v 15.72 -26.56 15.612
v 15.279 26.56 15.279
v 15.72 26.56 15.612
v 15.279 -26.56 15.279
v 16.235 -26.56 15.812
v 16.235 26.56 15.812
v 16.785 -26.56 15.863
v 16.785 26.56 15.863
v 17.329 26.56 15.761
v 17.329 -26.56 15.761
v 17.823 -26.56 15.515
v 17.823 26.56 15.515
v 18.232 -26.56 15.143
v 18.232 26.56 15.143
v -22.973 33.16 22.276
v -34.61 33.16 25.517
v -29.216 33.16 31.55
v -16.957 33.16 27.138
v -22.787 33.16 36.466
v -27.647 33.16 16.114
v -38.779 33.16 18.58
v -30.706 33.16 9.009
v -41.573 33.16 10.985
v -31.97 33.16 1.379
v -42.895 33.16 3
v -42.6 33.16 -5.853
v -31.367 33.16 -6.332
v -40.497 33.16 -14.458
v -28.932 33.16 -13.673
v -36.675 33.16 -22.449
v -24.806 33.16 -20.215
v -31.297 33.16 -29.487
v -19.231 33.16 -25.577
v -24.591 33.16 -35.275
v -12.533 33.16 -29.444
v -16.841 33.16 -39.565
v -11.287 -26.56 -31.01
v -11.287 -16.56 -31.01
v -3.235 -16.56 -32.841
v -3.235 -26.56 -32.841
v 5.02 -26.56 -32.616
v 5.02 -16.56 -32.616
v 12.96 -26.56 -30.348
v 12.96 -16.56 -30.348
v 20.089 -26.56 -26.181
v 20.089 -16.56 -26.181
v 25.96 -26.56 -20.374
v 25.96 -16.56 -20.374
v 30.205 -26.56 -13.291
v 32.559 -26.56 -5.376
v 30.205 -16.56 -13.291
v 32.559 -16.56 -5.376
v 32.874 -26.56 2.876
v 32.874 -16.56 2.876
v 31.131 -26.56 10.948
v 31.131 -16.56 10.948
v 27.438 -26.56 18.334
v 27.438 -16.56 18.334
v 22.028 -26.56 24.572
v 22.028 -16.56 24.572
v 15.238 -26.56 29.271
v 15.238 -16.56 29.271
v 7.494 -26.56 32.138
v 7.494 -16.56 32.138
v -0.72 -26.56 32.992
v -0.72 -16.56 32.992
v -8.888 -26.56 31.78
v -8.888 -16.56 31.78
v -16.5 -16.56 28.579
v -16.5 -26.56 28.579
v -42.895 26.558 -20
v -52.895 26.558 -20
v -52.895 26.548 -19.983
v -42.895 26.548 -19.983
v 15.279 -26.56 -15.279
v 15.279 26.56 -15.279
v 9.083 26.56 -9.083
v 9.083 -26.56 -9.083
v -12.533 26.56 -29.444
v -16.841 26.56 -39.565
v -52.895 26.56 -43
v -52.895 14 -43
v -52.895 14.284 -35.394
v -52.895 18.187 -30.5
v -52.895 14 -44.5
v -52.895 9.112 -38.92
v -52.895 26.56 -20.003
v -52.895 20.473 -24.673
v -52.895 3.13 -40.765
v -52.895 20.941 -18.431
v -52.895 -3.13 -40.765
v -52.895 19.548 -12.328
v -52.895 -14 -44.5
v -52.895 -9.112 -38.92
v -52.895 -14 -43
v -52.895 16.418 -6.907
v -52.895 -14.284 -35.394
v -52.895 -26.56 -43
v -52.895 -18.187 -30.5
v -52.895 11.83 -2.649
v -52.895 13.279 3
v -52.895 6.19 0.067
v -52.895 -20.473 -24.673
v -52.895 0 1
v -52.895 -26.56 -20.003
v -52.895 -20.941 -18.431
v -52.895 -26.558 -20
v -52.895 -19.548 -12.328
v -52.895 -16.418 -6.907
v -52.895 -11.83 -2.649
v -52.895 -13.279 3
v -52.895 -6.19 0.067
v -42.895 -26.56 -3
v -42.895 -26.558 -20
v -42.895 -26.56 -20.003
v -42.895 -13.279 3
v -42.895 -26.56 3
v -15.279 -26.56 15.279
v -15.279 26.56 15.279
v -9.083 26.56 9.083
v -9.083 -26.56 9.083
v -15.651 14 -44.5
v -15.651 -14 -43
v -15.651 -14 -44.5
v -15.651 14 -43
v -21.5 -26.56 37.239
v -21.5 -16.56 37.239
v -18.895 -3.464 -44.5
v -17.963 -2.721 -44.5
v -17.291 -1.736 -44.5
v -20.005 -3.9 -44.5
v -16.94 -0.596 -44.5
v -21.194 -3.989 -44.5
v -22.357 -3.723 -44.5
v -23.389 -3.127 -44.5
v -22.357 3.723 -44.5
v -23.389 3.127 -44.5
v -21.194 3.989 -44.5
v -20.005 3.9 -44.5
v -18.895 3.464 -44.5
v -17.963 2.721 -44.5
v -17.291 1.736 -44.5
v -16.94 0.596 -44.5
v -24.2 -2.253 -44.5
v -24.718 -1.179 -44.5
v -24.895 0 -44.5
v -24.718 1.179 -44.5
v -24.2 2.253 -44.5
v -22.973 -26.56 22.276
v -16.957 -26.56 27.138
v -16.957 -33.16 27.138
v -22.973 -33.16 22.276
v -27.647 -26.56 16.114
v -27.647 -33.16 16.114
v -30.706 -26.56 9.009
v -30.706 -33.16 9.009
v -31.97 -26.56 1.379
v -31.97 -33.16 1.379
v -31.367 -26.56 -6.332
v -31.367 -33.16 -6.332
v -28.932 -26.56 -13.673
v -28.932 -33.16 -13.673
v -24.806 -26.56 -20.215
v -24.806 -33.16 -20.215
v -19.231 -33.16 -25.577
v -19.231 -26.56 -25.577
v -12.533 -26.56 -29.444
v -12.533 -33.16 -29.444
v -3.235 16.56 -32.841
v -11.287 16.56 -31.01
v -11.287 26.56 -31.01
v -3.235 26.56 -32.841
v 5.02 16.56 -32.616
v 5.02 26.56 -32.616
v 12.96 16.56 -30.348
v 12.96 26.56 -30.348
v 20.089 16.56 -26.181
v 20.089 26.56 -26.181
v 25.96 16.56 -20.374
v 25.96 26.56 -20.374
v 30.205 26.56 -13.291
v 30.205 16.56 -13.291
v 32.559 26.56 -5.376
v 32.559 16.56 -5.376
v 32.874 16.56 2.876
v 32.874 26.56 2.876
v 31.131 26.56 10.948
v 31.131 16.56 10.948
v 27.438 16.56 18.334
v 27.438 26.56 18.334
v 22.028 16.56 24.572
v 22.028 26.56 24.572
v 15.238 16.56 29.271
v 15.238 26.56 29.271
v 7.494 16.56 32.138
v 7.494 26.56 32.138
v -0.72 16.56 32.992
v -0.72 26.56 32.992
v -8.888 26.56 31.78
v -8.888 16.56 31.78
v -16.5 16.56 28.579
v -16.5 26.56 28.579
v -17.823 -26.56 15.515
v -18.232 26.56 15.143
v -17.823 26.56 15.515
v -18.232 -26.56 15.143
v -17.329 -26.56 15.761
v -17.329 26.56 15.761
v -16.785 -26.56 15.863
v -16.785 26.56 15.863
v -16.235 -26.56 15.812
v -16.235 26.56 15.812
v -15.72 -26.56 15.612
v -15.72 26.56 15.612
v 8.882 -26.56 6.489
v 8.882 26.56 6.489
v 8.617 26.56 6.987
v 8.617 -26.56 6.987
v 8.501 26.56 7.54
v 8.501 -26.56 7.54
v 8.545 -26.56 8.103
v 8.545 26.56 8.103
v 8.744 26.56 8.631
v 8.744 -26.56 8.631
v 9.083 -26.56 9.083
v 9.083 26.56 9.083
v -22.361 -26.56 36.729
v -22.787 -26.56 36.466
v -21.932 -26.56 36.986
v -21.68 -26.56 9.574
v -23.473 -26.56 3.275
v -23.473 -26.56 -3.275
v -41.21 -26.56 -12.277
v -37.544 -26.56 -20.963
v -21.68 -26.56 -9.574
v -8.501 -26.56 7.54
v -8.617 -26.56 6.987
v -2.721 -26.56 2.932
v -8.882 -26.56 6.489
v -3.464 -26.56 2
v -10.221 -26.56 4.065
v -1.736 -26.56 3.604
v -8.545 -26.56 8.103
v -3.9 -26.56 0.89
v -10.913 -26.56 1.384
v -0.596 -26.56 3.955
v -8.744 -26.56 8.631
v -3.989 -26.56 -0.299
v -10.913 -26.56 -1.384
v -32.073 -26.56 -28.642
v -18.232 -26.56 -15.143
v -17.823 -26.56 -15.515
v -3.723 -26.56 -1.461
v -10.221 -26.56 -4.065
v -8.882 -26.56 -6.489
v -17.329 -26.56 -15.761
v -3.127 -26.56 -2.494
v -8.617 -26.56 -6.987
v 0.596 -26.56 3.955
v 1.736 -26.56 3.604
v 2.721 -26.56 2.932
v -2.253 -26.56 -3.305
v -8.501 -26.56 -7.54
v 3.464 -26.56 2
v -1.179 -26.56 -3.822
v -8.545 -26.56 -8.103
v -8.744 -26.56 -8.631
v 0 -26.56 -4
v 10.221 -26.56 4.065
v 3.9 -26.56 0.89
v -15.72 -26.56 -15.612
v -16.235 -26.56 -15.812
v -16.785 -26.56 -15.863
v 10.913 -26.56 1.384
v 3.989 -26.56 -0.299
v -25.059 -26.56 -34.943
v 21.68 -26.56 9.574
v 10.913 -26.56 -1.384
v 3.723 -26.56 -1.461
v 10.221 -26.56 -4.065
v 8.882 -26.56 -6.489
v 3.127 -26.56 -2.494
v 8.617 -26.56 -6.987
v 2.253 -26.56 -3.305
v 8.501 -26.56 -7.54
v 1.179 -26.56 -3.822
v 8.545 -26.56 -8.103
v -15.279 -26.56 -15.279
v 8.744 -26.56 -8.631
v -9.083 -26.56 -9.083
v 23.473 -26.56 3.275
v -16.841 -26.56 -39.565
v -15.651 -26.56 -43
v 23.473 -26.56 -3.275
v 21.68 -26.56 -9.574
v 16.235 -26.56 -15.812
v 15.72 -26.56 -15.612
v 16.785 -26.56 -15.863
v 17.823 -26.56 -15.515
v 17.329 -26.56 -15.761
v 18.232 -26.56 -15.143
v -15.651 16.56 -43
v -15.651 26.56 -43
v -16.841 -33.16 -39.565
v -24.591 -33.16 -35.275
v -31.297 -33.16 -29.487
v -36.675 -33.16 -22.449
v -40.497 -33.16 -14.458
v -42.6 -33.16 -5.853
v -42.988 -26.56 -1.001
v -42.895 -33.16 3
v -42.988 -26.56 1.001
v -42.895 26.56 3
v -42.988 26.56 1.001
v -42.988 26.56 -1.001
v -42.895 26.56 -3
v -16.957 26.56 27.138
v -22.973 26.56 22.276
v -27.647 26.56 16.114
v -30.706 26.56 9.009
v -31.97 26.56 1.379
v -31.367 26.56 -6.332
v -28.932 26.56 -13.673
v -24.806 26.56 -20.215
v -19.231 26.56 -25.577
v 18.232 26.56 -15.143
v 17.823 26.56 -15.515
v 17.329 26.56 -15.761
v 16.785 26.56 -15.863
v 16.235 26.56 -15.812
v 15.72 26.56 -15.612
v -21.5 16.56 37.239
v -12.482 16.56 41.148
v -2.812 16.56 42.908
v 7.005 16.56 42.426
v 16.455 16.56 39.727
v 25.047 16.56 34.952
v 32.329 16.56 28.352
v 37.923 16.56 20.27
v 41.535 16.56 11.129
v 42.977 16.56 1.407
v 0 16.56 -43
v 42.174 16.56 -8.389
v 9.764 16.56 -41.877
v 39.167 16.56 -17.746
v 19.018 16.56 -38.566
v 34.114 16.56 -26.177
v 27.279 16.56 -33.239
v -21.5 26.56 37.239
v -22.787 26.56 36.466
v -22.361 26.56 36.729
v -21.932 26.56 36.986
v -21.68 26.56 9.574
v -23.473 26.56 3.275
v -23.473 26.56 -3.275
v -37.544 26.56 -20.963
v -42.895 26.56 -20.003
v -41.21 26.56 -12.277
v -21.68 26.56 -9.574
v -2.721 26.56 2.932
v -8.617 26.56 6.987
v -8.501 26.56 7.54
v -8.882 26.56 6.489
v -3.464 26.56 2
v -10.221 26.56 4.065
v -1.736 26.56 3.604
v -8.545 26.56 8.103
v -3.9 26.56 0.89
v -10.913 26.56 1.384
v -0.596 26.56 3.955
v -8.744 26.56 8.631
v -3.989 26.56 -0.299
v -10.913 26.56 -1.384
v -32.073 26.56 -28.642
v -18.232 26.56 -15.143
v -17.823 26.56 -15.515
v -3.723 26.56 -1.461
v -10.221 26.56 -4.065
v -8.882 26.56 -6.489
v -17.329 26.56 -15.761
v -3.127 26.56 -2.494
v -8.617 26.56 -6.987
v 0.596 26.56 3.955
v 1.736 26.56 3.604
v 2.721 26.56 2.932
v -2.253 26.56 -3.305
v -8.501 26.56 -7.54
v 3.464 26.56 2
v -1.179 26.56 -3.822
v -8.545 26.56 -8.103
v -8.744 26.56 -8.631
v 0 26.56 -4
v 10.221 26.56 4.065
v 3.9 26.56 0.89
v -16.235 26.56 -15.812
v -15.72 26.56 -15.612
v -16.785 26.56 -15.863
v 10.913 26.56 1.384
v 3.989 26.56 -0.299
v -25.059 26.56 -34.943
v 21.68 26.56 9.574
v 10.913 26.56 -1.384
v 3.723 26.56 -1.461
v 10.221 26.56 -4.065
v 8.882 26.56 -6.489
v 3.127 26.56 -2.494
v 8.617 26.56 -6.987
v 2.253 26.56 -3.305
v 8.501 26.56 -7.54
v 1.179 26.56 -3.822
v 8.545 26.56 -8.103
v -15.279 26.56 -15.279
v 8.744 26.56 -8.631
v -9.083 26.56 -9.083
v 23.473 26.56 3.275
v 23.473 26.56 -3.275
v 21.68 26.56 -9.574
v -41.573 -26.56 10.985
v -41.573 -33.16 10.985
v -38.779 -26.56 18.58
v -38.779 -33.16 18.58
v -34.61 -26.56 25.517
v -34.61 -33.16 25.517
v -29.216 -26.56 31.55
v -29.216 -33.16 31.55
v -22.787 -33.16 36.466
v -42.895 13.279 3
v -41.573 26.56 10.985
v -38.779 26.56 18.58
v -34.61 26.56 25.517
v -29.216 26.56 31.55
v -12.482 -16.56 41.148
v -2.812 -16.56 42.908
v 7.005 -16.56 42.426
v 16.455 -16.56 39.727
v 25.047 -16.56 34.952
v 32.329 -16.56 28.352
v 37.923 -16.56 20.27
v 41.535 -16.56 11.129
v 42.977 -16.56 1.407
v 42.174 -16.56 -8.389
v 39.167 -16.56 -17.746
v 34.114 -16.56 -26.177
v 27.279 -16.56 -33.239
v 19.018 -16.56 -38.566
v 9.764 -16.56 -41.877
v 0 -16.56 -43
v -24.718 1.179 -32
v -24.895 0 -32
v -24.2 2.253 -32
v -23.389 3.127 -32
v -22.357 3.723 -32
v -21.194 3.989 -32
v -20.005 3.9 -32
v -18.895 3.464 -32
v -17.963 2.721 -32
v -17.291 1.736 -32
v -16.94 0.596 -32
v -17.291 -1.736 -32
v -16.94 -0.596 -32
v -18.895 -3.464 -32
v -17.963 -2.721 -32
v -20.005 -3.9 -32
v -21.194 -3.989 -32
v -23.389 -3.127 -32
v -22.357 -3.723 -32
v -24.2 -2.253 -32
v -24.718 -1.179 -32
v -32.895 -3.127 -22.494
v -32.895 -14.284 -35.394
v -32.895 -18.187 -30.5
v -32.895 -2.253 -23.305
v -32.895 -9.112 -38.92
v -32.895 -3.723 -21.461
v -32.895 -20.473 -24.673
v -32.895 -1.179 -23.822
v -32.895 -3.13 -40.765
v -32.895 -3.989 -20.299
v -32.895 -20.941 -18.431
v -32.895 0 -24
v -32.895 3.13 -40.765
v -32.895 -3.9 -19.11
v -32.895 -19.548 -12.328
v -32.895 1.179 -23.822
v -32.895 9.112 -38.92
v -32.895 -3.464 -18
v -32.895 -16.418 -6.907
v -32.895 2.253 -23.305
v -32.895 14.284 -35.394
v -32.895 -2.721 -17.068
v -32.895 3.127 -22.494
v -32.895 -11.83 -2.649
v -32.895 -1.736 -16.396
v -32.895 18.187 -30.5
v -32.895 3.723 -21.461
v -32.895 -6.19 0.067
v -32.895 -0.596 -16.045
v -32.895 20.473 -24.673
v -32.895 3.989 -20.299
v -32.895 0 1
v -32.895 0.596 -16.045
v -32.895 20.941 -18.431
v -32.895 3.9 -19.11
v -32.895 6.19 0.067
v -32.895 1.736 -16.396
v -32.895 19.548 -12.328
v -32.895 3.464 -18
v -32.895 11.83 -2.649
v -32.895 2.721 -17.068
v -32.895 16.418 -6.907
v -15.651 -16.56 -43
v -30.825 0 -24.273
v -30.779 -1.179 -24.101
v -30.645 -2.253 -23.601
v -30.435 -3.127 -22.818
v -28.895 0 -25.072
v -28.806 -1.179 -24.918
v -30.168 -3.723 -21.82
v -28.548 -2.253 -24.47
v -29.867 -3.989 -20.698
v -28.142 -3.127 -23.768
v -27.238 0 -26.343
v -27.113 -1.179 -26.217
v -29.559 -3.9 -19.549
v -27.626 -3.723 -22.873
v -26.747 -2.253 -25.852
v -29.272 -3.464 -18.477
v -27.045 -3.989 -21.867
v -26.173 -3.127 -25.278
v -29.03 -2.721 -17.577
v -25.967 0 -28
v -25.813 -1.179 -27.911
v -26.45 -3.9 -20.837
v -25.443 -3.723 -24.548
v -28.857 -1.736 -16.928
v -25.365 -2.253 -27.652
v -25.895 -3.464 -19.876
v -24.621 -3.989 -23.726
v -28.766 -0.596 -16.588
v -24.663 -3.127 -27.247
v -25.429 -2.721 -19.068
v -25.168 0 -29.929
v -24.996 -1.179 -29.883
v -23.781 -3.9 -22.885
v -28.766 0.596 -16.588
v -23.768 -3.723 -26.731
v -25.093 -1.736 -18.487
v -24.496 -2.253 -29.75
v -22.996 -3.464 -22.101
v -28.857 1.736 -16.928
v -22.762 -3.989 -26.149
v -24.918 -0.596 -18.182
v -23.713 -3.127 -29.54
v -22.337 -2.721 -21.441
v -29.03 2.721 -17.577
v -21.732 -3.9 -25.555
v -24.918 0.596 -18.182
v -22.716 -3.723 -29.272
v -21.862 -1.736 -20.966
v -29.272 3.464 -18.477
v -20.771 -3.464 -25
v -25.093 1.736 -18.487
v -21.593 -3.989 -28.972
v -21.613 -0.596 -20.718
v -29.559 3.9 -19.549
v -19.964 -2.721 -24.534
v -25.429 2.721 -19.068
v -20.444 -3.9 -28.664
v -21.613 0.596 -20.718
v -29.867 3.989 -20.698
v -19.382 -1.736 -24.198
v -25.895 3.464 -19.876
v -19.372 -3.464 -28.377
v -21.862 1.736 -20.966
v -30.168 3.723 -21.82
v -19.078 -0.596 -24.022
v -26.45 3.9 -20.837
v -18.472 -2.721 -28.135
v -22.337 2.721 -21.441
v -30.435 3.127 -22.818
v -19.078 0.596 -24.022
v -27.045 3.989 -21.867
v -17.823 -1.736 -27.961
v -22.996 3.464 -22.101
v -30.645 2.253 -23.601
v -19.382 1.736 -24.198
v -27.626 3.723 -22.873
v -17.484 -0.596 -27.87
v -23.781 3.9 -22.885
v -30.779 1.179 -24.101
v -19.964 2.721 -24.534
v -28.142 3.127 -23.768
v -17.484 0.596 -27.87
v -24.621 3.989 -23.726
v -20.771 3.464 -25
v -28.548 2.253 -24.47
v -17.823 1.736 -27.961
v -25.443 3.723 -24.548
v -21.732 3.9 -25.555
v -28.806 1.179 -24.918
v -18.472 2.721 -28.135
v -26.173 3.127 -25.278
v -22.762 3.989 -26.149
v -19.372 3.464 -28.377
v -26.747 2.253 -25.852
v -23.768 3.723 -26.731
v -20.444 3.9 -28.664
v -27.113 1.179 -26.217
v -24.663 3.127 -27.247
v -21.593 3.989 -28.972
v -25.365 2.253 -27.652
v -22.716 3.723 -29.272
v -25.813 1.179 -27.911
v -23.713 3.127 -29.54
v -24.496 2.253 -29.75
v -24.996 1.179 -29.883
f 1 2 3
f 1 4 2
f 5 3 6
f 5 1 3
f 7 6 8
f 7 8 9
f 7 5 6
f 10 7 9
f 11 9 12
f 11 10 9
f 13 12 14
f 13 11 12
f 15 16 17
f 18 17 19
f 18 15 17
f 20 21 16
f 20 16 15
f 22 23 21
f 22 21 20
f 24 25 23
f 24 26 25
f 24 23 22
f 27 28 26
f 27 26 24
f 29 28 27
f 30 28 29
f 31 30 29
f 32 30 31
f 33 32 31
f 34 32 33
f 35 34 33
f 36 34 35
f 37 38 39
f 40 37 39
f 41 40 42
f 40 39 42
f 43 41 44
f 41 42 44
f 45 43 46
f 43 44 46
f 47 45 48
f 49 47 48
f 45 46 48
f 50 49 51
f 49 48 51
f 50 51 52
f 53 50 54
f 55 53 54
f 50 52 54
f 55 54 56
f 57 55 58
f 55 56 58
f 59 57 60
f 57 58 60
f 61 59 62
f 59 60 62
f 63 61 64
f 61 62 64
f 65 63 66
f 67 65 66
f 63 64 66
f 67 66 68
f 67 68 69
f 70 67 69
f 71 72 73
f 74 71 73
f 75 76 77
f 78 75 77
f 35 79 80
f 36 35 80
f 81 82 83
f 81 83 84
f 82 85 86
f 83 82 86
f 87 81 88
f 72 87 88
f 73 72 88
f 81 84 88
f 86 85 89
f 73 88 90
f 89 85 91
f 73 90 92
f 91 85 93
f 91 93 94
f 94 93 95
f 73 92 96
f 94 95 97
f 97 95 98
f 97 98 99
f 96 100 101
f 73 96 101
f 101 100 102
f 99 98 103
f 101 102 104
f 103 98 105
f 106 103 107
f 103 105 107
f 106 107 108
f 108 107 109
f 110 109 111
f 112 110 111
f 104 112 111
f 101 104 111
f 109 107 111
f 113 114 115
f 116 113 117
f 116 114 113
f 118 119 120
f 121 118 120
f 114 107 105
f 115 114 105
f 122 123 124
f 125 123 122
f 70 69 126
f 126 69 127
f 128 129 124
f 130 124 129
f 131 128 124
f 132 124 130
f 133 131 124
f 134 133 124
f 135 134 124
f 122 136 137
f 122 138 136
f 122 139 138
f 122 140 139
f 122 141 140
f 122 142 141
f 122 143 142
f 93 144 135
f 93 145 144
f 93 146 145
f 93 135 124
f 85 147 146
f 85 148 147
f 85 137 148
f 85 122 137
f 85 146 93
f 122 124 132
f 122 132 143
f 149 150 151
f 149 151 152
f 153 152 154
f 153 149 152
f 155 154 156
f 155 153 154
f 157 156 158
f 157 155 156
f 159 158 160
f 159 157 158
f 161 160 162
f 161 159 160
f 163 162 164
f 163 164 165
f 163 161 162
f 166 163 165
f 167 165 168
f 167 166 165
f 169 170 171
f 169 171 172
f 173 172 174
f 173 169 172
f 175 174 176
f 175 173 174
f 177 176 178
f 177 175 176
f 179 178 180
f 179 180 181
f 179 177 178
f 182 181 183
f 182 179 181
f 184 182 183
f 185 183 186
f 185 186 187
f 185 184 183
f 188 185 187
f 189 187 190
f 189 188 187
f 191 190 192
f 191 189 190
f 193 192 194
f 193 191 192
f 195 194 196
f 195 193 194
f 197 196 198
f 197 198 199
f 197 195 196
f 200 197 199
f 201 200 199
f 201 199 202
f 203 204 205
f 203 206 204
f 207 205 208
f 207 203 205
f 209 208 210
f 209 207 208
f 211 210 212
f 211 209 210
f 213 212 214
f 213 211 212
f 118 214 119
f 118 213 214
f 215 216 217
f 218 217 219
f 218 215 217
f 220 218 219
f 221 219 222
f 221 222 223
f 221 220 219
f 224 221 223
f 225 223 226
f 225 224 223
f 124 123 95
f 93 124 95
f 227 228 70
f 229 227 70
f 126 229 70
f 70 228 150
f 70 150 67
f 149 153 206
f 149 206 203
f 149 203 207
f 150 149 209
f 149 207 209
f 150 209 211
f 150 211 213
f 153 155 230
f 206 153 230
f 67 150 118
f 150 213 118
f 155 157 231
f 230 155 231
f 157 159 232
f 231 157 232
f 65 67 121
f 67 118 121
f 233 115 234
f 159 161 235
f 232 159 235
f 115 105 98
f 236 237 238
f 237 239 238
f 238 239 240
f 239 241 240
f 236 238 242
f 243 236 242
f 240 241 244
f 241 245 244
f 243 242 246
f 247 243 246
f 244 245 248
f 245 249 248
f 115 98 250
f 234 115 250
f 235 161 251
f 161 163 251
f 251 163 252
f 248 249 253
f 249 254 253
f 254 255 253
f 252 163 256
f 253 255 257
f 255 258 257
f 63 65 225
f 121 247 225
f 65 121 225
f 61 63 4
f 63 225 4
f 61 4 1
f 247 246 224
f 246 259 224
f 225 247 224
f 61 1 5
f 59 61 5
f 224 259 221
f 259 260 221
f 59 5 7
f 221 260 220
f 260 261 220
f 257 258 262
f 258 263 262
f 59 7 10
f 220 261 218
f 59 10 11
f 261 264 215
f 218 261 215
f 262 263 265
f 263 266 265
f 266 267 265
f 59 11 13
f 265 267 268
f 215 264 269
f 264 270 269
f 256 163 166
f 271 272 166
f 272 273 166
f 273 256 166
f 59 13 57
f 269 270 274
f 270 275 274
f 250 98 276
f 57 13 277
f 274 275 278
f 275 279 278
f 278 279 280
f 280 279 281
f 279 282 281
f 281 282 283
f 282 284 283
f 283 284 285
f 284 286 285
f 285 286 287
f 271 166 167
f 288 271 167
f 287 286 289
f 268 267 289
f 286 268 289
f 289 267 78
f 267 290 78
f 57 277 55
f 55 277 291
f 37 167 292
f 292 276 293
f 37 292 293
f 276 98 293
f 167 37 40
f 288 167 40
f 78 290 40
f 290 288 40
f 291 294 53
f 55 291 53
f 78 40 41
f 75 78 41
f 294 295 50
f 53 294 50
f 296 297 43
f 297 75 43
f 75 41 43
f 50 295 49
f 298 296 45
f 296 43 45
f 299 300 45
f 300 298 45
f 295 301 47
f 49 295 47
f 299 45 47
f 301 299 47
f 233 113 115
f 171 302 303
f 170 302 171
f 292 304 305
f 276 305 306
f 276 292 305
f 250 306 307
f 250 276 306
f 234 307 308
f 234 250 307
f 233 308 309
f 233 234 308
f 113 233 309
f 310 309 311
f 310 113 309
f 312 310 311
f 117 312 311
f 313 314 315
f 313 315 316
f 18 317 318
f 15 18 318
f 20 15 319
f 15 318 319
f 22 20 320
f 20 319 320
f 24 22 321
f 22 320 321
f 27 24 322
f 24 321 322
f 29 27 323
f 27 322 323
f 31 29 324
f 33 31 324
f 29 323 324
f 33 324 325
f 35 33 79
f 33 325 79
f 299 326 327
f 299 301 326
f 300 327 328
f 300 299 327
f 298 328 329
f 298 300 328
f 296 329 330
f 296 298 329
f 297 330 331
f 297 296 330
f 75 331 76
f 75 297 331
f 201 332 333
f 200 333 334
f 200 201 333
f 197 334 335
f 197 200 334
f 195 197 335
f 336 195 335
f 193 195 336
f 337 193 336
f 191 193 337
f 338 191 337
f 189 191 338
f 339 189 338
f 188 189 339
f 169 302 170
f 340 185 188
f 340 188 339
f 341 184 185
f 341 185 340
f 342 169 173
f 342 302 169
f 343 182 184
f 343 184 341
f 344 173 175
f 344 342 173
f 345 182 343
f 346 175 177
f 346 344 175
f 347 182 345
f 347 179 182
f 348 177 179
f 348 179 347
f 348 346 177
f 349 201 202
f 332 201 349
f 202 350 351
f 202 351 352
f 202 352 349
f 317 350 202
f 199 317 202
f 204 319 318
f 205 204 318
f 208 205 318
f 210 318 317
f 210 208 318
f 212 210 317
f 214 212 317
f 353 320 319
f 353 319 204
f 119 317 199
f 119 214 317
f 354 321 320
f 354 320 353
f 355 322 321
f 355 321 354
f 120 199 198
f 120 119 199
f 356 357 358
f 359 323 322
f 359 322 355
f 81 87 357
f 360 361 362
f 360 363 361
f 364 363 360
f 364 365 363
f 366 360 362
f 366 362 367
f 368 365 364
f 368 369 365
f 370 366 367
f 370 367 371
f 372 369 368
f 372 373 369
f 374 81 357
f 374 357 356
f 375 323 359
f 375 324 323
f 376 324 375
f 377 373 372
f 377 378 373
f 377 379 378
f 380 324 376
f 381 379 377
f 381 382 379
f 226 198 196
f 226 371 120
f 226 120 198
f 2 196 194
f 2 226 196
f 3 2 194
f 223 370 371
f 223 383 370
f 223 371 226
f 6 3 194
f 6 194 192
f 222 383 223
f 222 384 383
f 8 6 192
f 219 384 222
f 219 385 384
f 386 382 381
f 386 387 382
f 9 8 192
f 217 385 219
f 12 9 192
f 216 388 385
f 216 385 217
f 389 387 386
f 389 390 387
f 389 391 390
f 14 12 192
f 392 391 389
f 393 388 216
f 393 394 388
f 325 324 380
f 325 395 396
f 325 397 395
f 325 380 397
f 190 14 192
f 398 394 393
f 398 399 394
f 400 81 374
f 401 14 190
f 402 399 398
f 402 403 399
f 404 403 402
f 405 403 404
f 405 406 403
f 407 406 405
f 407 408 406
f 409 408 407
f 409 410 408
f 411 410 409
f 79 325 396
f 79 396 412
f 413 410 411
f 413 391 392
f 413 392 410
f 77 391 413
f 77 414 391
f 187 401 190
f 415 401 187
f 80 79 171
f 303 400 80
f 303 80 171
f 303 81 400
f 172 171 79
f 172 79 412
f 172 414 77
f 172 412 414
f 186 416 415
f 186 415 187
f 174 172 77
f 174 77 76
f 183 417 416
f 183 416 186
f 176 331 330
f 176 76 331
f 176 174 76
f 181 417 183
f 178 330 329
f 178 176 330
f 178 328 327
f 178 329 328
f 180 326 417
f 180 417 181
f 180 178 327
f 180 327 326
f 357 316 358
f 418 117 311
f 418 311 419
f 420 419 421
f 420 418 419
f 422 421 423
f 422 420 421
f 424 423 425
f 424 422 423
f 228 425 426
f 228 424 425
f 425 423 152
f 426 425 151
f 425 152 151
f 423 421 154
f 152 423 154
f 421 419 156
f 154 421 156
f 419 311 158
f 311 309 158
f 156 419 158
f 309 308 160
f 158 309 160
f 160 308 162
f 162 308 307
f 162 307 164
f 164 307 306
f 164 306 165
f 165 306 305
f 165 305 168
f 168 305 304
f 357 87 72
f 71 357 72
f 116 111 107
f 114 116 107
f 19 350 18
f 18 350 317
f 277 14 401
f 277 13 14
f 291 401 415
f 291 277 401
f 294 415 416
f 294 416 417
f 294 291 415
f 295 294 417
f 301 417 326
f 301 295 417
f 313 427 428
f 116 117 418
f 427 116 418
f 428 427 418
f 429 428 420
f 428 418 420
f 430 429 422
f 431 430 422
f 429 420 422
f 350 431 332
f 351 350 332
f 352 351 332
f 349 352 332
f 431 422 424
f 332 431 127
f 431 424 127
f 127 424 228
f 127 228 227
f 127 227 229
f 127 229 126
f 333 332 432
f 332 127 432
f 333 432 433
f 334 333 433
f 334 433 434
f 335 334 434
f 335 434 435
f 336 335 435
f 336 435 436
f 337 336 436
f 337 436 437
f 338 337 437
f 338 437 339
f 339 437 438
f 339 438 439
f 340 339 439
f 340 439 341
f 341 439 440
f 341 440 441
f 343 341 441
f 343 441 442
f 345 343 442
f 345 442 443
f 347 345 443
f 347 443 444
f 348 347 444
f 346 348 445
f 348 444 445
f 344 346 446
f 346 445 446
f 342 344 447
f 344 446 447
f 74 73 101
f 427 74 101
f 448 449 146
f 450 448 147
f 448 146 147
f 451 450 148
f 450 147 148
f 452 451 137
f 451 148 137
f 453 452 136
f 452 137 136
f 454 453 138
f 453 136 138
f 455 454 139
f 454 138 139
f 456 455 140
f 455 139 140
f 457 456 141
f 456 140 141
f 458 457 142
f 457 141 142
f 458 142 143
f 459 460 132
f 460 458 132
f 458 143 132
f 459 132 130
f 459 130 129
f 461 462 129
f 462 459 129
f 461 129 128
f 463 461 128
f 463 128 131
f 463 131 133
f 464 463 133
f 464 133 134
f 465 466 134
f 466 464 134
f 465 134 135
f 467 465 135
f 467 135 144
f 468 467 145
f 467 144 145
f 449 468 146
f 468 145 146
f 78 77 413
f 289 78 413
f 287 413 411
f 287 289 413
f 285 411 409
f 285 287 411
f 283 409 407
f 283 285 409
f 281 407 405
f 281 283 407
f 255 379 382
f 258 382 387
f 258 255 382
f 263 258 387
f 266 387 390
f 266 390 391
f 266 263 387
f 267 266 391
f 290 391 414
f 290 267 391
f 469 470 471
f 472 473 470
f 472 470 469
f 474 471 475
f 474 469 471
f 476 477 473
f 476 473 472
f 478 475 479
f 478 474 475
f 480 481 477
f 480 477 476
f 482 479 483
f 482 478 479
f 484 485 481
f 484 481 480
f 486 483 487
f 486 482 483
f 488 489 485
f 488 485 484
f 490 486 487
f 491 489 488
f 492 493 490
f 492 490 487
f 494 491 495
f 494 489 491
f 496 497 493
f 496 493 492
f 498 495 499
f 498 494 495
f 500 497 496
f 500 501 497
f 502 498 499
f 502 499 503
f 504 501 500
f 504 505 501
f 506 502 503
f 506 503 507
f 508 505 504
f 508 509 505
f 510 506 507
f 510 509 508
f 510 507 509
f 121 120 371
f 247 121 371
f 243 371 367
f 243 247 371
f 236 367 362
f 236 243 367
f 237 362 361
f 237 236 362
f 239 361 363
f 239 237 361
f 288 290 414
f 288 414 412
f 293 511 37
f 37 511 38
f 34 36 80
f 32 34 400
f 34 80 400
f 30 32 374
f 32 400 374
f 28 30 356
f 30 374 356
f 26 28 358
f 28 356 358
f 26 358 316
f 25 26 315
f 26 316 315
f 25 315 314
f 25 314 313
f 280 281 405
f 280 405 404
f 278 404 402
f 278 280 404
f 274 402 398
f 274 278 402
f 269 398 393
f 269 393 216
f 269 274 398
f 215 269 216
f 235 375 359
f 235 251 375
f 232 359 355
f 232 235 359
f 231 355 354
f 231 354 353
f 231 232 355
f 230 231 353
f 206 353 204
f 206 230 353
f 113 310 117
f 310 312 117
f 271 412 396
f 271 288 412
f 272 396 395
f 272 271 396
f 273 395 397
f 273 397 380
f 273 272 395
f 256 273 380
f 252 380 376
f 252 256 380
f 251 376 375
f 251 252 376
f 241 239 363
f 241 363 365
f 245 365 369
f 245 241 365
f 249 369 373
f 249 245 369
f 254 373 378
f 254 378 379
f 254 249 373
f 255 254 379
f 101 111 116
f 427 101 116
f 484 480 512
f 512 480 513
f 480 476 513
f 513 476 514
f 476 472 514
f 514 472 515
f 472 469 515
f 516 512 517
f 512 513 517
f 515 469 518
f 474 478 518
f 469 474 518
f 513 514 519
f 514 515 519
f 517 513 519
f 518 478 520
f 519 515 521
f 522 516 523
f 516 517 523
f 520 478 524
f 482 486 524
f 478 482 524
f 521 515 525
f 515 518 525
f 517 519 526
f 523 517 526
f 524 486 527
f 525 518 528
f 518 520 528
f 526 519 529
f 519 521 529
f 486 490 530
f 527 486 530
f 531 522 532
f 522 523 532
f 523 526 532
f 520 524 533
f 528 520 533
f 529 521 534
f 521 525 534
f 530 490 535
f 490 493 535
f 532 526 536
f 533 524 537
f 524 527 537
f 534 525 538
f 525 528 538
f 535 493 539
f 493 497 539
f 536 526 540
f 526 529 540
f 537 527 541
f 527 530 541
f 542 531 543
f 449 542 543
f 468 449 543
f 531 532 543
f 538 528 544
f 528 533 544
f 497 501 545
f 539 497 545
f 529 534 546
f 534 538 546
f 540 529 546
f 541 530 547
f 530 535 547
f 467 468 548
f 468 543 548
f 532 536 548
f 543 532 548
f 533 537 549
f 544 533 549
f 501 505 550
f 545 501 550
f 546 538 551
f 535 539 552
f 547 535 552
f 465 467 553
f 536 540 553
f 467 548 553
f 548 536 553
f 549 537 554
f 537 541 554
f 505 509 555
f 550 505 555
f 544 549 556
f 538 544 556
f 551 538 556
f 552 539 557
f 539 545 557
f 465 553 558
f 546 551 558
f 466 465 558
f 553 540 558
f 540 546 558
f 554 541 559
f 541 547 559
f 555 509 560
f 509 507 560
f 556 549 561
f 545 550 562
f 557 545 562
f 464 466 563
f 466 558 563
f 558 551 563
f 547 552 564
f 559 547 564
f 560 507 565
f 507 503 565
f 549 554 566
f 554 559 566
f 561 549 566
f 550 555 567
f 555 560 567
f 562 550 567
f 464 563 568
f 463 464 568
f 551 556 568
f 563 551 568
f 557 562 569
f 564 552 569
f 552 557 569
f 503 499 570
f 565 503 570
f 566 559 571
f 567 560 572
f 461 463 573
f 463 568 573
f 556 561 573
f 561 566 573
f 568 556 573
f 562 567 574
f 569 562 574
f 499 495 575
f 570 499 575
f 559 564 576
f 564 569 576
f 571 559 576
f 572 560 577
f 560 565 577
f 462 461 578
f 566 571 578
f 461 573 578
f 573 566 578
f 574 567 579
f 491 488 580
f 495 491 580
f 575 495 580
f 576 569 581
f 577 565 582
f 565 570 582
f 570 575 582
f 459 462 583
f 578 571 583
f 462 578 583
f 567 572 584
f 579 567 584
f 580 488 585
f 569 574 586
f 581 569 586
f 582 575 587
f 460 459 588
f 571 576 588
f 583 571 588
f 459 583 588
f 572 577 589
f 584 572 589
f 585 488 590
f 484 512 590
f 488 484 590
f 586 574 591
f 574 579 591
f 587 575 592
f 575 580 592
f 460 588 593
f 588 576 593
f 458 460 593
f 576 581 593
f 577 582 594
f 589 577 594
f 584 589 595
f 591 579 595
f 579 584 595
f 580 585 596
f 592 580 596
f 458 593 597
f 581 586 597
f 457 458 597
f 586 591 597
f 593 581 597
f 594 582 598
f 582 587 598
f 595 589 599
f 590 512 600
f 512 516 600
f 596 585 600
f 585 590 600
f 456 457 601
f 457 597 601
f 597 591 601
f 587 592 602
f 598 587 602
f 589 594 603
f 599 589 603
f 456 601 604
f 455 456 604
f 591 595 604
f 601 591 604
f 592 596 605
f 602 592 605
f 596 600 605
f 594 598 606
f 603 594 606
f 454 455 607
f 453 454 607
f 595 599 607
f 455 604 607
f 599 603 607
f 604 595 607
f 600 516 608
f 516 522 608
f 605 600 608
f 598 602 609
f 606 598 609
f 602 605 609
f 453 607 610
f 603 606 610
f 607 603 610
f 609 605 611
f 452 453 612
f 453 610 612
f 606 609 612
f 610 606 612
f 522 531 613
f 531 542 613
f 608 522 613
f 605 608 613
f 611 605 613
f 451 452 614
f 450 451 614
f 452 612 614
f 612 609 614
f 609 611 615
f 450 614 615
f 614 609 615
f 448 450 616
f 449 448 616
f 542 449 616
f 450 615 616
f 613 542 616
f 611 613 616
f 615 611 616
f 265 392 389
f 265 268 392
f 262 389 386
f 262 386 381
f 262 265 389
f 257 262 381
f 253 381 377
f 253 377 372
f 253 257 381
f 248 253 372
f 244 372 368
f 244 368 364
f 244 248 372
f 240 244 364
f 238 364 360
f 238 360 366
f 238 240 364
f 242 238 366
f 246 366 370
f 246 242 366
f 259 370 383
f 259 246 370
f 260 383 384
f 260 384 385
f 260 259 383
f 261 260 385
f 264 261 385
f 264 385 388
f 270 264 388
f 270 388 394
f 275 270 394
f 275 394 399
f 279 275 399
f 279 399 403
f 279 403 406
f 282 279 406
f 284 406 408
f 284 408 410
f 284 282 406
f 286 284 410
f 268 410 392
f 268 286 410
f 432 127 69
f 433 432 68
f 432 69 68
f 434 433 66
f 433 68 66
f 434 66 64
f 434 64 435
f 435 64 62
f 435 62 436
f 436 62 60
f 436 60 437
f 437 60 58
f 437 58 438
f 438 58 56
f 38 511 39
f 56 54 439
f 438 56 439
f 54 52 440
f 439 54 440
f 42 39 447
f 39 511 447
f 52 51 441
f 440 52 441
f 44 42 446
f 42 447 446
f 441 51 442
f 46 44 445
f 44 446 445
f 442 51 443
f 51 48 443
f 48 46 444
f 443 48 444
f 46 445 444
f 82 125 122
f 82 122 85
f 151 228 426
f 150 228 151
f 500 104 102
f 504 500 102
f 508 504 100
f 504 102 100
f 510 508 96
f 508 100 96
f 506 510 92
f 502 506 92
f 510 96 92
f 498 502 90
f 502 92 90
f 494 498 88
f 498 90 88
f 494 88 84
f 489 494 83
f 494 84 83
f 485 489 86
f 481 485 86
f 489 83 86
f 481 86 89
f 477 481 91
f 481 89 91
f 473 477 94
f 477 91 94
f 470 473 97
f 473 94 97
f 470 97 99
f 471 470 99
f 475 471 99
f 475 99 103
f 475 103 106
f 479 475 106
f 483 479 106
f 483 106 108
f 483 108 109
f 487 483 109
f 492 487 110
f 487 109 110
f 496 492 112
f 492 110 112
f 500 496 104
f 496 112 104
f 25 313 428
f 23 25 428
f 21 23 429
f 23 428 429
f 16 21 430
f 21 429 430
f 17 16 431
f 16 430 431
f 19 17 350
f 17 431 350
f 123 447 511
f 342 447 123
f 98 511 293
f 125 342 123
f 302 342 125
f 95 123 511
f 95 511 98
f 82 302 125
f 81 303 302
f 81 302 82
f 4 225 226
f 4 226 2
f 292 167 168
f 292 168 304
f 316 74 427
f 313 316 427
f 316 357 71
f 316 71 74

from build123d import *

# Parameters (mm, degrees)
SKETCH1_R           = 4
BOSS_EXTRUDE1_DEPTH = 26.56
CUT_EXTRUDE1_START  = -10
CUT_EXTRUDE1_DEPTH  = 10
BOSS_EXTRUDE2_DEPTH = 6.6
CUT_EXTRUDE2_DEPTH  = 10
SKETCH4_R           = 21
CUT_EXTRUDE3_DEPTH  = 20
SKETCH5_W           = 37.244501106
SKETCH5_H           = 28
BOSS_EXTRUDE3_DEPTH = 1.5
SKETCH7_R           = 4


with BuildPart() as part:
    # Sketch1 → Boss-Extrude1 (new body)
    with BuildSketch(Plane(origin=(0, 0, 0), x_dir=(1, 0, 0), z_dir=(0, 1, 0))):
        with BuildLine():
            Line((0, 43), (-52.895221179, 43))
            Line((-52.895221179, 43), (-52.895221179, -3))
            Line((-52.895221179, -3), (-42.895221179, -3))
            ThreePointArc((-42.895221179, -3), (31.448370387, -29.325756597), (0, 43))
        make_face()
        with Locations(Location((0, 0, 0), (0, 0, 90))):
            Circle(SKETCH1_R, mode=Mode.SUBTRACT)
        with BuildLine():
            Line((-15.278907029, -15.278907029), (-9.082951062, -9.082951062))
            ThreePointArc((-9.082951062, -9.082951062), (-8.503126103, -7.8230436), (-8.882216221, -6.488931731))
            ThreePointArc((-8.882216221, -6.488931731), (-11, 0), (-8.882216221, 6.488931731))
            ThreePointArc((-8.882216221, 6.488931731), (-8.503126103, 7.8230436), (-9.082951062, 9.082951062))
            Line((-9.082951062, 9.082951062), (-15.278907029, 15.278907029))
            ThreePointArc((-15.278907029, 15.278907029), (-16.785384719, 15.862564166), (-18.231657051, 15.142545399))
            ThreePointArc((-18.231657051, 15.142545399), (-23.7, 0), (-18.231657051, -15.142545399))
            ThreePointArc((-18.231657051, -15.142545399), (-16.785384719, -15.862564166), (-15.278907029, -15.278907029))
        make_face(mode=Mode.SUBTRACT)
        with BuildLine():
            Line((15.278907029, 15.278907029), (9.082951062, 9.082951062))
            ThreePointArc((9.082951062, 9.082951062), (8.503126103, 7.8230436), (8.882216221, 6.488931731))
            ThreePointArc((8.882216221, 6.488931731), (11, 0), (8.882216221, -6.488931731))
            ThreePointArc((8.882216221, -6.488931731), (8.503126103, -7.8230436), (9.082951062, -9.082951062))
            Line((9.082951062, -9.082951062), (15.278907029, -15.278907029))
            ThreePointArc((15.278907029, -15.278907029), (16.785384719, -15.862564166), (18.231657051, -15.142545399))
            ThreePointArc((18.231657051, -15.142545399), (23.7, 0), (18.231657051, 15.142545399))
            ThreePointArc((18.231657051, 15.142545399), (16.785384719, 15.862564166), (15.278907029, 15.278907029))
        make_face(mode=Mode.SUBTRACT)
    boss_extrude1 = extrude(amount=BOSS_EXTRUDE1_DEPTH)

    # Sketch2 → Cut-Extrude1 (cut)
    with BuildSketch(Plane(origin=(0, 26.56, 0), x_dir=(1, 0, 0), z_dir=(0, 1, 0)).offset(CUT_EXTRUDE1_START)):
        with BuildLine():
            Line((-16.5, -28.578838325), (-21.5, -37.239092363))
            ThreePointArc((-21.5, -37.239092363), (41.53481053, -11.129218939), (0, 43))
            Line((0, 43), (-15.650720073, 43))
            Line((-15.650720073, 43), (-11.28666473, 31.009856486))
            ThreePointArc((-11.28666473, 31.009856486), (32.874425037, -2.876139511), (-16.5, -28.578838325))
        make_face()
    cut_extrude1 = extrude(amount=CUT_EXTRUDE1_DEPTH, mode=Mode.SUBTRACT)

    # Sketch2<3> → Boss-Extrude2 (add)
    with BuildSketch(Plane(origin=(0, 26.56, 0), x_dir=(1, 0, 0), z_dir=(0, 1, 0))):
        with BuildLine():
            ThreePointArc((-42.895221179, -3), (-36.85807218, -22.146839847), (-22.786528362, -36.466068135))
            Line((-22.786528362, -36.466068135), (-16.957416455, -27.137539077))
            ThreePointArc((-16.957416455, -27.137539077), (-31.902604506, 2.494759659), (-12.532809858, 29.443652577))
            Line((-12.532809858, 29.443652577), (-16.840963246, 39.56490815))
            ThreePointArc((-16.840963246, 39.56490815), (-36.674865833, 22.448924609), (-42.895221179, -3))
        make_face()
    boss_extrude2 = extrude(amount=BOSS_EXTRUDE2_DEPTH)

    # Mirror1: Boss-Extrude1, Cut-Extrude1, Boss-Extrude2 across plane
    add(boss_extrude1.mirror(Plane.ZX))
    add(cut_extrude1.mirror(Plane.ZX), mode=Mode.SUBTRACT)
    add(boss_extrude2.mirror(Plane.ZX))

    # Sketch3 → Cut-Extrude2 (cut)
    with BuildSketch(Plane.ZY.offset(52.895221179)):
        Polygon((-19.982907976, 26.548244298), (3, 13.279056191), (3, 26.56), (-20.003269449, 26.56), (-20, 26.558112383), align=None)
        Polygon((3, -26.56), (3, -13.279056191), (-20, -26.558112383), (-20.003269449, -26.56), align=None)
    extrude(amount=-CUT_EXTRUDE2_DEPTH, mode=Mode.SUBTRACT)

    # Sketch4 → Cut-Extrude3 (cut)
    with BuildSketch(Plane.ZY.offset(52.895221179)):
        with Locations((-20, 0)):
            Circle(SKETCH4_R)
    extrude(amount=-CUT_EXTRUDE3_DEPTH, mode=Mode.SUBTRACT)

    # Sketch5 → Boss-Extrude3 (add)
    with BuildSketch(Plane(origin=(0, 0, -43), x_dir=(-1, 0, 0), z_dir=(0, 0, -1))):
        with Locations((34.272970626, 0)):
            Rectangle(SKETCH5_W, SKETCH5_H)
    extrude(amount=BOSS_EXTRUDE3_DEPTH)

    # Cut-Sweep3: sweep along a path in Sketch6
    with BuildLine(Plane(origin=(0, 0, 0), x_dir=(1, 0, 0), z_dir=(0, 1, 0))) as cut_sweep3_path:
        Line((-52.895221179, 20), (-32.895221179, 20))
        ThreePointArc((-32.895221179, 20), (-24.409939805, 23.514718626), (-20.895221179, 32))
        Line((-20.895221179, 32), (-20.895221179, 44.5))
    # Sketch7 → Cut-Sweep3 (sweep, cut)
    with BuildSketch(Plane(origin=(0, 0, -44.5), x_dir=(-1, 0, 0), z_dir=(0, 0, -1))):
        with Locations((20.895221179, 0)):
            Circle(SKETCH7_R)
    sweep(path=cut_sweep3_path.line, mode=Mode.SUBTRACT)


solid = part.part
